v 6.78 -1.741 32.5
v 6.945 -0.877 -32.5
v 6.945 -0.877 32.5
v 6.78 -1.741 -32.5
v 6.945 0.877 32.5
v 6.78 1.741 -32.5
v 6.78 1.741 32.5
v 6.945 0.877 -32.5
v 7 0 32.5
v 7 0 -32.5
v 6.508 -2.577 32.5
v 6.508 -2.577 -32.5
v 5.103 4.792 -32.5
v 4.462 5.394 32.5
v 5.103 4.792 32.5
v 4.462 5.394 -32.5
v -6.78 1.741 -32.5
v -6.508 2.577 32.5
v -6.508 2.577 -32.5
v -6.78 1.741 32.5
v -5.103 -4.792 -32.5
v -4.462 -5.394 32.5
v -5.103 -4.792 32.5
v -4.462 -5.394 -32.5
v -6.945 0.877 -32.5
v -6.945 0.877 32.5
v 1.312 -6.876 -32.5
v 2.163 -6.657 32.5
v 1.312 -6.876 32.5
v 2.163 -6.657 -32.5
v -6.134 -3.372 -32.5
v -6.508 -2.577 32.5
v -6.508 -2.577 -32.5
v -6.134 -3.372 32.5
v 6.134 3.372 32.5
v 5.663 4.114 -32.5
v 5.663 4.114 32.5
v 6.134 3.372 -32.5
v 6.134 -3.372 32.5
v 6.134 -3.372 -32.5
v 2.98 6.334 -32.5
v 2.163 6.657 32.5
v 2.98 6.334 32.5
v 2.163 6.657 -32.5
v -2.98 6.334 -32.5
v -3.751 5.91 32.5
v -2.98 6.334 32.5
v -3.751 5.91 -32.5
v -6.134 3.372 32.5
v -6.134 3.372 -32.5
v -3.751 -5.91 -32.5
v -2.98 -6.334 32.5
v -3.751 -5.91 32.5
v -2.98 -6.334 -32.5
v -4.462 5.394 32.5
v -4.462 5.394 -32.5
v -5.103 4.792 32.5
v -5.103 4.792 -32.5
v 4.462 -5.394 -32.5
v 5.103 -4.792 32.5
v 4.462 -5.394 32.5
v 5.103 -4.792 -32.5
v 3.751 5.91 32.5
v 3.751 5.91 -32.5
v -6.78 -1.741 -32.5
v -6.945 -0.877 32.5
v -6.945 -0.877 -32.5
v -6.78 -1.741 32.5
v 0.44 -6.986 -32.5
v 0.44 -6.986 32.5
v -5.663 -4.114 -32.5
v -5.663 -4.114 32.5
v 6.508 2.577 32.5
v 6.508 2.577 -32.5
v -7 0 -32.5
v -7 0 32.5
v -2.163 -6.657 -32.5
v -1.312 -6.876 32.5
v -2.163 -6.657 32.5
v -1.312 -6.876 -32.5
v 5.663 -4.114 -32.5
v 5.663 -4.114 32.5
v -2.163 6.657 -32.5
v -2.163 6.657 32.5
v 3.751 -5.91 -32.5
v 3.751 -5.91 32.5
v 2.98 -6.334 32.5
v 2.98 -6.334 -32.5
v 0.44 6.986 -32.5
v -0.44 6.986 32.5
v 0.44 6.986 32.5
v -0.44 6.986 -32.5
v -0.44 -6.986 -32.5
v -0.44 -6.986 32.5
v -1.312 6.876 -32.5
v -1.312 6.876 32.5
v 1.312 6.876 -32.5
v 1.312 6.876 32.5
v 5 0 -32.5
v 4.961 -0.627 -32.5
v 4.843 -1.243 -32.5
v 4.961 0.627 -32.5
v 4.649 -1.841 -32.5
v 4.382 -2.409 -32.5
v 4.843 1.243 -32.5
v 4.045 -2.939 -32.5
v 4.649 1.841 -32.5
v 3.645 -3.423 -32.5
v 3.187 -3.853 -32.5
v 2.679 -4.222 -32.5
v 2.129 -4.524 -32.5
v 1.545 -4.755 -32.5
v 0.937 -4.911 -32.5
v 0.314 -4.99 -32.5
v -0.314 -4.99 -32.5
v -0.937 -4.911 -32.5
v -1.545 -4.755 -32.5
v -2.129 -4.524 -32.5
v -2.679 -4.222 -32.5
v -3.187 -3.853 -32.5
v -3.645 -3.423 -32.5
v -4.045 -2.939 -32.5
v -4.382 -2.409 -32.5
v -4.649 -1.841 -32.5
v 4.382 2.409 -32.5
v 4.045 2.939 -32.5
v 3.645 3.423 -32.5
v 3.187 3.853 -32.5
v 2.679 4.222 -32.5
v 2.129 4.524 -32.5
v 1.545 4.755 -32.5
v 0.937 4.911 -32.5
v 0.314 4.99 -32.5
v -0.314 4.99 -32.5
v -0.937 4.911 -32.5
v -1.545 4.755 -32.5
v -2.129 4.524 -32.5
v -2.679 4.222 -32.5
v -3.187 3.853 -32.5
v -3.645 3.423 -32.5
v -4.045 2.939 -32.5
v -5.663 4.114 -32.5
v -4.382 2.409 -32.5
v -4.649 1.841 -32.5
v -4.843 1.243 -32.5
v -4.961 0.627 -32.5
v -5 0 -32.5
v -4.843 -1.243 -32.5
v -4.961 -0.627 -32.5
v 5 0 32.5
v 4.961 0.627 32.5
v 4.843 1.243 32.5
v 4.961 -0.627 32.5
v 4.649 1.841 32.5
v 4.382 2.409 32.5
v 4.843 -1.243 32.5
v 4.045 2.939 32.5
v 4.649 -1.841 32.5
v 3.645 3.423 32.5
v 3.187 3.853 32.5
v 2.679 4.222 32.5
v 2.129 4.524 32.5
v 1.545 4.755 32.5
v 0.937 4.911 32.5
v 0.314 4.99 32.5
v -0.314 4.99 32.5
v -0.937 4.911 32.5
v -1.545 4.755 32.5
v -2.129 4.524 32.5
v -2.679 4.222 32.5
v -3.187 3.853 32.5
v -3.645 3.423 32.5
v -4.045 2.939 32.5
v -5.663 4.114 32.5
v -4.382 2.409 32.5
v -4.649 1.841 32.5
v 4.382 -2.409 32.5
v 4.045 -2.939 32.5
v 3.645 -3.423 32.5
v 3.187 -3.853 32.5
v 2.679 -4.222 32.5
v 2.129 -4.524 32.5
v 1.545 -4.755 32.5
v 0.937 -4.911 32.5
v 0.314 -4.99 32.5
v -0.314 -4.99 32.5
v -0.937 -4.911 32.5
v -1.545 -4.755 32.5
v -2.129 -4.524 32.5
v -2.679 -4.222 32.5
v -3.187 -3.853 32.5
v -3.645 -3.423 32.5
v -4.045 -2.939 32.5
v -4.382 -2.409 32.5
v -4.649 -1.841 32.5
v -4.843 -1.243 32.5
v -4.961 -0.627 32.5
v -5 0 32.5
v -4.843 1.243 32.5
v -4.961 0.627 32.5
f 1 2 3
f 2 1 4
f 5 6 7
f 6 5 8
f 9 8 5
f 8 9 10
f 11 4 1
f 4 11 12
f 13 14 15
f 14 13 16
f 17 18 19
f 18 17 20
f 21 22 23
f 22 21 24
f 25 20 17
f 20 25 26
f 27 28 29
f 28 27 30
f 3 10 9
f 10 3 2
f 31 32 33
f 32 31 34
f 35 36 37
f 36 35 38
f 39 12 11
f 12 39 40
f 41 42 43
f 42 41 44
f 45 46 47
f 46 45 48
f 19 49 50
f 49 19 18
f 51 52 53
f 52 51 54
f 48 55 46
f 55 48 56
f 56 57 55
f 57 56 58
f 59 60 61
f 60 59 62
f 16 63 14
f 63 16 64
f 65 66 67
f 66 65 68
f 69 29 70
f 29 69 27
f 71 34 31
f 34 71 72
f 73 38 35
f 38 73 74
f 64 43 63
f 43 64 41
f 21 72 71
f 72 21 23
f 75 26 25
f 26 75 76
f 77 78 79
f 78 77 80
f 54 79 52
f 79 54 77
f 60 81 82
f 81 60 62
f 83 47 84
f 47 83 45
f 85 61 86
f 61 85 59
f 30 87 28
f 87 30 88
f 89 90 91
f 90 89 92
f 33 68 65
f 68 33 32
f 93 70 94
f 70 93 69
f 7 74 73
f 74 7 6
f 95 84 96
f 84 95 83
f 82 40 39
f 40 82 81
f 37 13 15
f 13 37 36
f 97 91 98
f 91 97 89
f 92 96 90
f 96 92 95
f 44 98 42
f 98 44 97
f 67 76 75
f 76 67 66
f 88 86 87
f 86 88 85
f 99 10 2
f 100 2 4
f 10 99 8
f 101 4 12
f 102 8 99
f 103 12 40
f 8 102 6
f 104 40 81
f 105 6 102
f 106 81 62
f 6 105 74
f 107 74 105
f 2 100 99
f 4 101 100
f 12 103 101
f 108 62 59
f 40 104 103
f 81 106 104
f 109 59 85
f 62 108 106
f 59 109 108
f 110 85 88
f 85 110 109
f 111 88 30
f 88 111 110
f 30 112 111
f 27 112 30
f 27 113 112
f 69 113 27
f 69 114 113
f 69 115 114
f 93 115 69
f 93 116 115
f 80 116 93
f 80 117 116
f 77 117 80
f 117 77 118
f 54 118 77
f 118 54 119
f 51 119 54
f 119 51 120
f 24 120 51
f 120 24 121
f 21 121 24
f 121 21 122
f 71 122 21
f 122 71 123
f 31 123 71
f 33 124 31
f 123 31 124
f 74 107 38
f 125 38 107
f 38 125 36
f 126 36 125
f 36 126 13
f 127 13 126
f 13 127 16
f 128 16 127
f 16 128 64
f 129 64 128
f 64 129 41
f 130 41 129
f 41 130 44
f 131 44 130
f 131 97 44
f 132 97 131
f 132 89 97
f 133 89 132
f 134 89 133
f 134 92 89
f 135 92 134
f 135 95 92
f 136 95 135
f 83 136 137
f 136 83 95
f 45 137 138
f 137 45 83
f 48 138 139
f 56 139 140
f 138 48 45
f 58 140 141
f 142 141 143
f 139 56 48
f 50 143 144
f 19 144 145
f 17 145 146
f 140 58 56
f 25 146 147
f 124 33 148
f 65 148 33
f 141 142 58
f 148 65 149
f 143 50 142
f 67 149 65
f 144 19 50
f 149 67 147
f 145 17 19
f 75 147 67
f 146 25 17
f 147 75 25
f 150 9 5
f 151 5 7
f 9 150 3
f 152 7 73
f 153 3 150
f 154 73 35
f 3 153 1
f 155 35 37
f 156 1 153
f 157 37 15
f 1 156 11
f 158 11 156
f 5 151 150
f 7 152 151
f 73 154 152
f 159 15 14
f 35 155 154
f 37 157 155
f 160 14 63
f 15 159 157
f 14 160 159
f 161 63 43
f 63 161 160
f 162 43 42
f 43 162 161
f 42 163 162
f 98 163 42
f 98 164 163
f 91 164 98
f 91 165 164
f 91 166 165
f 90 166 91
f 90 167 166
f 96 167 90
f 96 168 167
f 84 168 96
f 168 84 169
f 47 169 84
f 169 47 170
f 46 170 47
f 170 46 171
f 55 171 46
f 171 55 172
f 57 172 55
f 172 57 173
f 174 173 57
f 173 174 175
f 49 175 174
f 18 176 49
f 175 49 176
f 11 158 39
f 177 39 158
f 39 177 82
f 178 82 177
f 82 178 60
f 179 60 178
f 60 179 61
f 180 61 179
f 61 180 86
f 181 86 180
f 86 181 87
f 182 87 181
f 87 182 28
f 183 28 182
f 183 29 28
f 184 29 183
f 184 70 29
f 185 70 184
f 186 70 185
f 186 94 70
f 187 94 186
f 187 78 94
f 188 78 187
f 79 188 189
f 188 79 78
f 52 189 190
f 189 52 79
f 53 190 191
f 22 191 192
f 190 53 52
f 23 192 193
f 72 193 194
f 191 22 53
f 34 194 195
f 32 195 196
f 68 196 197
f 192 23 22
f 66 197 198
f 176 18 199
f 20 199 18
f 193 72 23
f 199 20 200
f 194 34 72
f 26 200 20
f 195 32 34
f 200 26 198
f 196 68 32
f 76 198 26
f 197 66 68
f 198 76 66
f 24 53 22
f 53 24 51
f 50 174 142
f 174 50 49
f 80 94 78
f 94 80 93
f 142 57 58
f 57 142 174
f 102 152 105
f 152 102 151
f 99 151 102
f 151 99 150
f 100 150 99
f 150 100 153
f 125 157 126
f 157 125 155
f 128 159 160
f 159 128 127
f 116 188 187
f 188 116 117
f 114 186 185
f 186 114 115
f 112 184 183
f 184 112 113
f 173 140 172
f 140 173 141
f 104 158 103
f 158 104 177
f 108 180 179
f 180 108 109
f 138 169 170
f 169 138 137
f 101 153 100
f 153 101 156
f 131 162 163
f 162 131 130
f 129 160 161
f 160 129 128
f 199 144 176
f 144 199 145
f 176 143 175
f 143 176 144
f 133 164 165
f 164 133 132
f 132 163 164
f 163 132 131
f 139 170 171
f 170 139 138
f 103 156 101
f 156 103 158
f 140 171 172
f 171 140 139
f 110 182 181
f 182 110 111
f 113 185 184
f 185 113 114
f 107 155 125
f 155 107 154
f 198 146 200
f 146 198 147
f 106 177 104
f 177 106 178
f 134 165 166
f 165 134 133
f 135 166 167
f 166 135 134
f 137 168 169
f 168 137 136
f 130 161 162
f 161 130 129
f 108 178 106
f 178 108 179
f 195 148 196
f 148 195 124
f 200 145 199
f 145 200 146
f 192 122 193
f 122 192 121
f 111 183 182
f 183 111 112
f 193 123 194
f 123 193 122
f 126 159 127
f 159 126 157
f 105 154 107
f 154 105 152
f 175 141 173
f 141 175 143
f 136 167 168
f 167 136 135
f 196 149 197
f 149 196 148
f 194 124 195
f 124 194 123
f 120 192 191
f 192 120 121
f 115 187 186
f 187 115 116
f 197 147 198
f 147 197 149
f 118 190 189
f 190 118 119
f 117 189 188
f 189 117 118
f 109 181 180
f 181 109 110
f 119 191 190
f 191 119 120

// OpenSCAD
$fn = 50;


difference() {
	union() {
		translate(v = [0, 0, -32.5000000000]) {
			cylinder(h = 65, r = 7.0000000000);
		}
	}
	union() {
		translate(v = [0, 0, -100.0000000000]) {
			cylinder(h = 200, r = 5.0000000000);
		}
	}
}
